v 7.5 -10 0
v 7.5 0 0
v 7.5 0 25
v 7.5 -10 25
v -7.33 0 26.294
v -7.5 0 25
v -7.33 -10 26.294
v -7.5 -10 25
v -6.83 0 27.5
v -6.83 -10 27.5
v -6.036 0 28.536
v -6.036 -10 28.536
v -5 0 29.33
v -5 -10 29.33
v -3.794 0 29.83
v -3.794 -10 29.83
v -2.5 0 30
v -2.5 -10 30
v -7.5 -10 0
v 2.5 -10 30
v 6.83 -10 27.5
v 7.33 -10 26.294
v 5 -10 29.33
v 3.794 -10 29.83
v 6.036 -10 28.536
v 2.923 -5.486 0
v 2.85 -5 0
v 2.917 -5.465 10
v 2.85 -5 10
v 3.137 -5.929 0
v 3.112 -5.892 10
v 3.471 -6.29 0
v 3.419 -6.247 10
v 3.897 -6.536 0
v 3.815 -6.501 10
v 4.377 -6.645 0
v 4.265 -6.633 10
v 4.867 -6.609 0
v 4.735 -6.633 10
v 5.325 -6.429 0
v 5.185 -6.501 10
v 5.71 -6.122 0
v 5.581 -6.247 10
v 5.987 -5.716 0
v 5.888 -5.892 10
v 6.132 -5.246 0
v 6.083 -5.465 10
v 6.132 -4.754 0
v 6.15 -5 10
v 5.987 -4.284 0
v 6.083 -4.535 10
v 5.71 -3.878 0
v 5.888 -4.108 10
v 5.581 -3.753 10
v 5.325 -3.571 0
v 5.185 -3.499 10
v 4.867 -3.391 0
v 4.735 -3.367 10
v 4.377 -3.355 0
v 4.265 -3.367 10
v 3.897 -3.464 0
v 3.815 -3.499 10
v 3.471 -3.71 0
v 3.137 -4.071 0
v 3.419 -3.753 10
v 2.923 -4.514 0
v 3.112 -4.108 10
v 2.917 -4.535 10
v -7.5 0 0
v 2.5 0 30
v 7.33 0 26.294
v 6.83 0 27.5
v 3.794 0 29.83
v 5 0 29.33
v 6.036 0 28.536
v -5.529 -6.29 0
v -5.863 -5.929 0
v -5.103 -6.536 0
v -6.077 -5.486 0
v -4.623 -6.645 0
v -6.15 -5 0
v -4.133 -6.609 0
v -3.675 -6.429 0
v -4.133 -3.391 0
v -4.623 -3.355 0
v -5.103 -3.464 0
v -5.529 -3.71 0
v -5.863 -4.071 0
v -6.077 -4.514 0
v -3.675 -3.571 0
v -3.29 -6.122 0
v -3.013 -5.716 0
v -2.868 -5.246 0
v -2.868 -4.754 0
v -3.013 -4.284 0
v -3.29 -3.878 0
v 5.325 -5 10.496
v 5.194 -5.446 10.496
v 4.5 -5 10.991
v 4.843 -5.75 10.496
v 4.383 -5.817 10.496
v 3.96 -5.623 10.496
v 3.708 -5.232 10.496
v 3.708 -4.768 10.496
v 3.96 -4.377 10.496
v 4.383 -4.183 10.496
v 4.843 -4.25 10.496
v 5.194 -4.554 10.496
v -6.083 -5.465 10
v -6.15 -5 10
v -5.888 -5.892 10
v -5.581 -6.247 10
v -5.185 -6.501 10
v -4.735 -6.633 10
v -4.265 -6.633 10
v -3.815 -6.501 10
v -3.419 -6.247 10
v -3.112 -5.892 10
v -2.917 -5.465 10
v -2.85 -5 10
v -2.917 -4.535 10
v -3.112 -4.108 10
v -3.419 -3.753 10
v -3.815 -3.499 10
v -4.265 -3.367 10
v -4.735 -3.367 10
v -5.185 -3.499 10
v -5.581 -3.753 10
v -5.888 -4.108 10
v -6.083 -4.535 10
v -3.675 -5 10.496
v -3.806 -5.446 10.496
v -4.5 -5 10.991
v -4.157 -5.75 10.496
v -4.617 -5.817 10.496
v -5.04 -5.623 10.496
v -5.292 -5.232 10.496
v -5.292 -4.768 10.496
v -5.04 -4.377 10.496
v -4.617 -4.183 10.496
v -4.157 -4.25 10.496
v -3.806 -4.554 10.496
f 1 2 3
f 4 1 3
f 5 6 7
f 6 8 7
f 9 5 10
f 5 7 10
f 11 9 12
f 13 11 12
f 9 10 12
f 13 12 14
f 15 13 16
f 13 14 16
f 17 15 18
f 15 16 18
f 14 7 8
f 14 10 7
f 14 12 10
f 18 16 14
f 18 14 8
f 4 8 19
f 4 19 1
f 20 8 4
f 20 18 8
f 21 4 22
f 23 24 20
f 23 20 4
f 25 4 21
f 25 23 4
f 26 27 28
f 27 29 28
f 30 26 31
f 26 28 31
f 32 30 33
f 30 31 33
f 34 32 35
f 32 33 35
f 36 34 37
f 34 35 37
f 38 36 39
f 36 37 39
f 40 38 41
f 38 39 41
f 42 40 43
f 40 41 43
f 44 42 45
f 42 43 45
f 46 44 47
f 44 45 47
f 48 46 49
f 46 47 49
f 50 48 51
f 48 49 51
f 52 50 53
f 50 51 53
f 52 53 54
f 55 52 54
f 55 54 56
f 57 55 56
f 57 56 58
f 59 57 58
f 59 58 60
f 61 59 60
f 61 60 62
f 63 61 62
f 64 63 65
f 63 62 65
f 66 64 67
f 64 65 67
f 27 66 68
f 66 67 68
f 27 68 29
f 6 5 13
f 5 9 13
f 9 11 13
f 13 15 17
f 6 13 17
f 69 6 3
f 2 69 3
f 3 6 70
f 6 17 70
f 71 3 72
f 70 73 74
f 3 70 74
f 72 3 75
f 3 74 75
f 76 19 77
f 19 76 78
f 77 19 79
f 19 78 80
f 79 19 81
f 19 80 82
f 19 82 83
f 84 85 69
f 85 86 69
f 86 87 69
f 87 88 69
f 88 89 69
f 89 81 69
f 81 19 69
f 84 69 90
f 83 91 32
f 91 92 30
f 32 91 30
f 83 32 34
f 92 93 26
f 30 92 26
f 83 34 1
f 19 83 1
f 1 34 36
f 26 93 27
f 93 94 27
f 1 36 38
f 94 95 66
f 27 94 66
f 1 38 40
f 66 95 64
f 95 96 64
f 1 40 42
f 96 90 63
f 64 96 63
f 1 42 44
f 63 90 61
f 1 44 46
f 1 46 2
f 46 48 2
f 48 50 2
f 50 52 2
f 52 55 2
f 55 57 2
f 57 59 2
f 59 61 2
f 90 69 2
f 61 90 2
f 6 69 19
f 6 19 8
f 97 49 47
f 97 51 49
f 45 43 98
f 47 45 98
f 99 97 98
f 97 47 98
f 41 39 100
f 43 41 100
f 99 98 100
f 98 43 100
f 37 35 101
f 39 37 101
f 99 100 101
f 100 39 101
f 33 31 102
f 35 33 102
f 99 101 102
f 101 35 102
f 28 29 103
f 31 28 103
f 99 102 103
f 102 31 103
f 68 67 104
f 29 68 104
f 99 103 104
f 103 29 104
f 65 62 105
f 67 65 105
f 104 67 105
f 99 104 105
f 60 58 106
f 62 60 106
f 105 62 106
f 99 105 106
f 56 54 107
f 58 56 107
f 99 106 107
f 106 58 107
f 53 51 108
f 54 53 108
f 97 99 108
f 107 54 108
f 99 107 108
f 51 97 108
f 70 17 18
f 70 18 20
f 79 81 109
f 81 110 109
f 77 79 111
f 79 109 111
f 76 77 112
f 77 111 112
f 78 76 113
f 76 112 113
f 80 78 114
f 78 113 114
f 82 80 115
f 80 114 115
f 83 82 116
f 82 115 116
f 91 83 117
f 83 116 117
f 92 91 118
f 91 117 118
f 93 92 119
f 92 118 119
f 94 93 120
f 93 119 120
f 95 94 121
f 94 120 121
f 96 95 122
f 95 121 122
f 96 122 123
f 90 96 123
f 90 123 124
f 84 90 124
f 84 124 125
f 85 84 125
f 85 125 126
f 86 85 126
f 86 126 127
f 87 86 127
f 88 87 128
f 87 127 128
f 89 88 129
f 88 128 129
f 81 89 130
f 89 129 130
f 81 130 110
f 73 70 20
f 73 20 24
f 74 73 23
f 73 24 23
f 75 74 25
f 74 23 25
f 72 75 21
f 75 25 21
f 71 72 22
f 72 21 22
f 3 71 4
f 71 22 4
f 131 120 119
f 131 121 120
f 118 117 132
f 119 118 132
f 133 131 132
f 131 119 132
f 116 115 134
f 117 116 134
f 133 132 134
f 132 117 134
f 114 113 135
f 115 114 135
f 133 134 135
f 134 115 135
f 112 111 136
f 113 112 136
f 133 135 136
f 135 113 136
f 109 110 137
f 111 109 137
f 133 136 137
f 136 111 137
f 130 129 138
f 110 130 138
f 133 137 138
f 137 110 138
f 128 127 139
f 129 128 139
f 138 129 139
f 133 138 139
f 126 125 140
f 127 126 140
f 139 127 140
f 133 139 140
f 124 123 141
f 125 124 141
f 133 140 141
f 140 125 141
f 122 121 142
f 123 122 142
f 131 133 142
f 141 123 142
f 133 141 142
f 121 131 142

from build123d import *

# Parameters (mm, degrees)
F0_W     = 15
F0_H     = 30
F1_DEPTH = 10
F3_D     = 3.3
F3_DEPTH = 10
F3_TIP   = 0.9914200214
F4_R     = 5


with BuildPart() as f1:
    # F0 (on Front) → F1 (new body)
    with BuildSketch(Plane.XZ):
        with Locations((0, 15)):
            Rectangle(F0_W, F0_H)
    extrude(amount=F1_DEPTH)

    # F3
    with Locations(Plane(origin=(0, 0, 0), x_dir=(1, 0, 0), z_dir=(0, 0, -1))):
        with Locations((-4.5, 5), (4.5, 5)):
            Hole(F3_D / 2, depth=F3_DEPTH)
            with Locations((0, 0, -(F3_DEPTH + F3_TIP / 2))):  # 118° drill point
                Cone(0, F3_D / 2, F3_TIP, mode=Mode.SUBTRACT)

    # F4
    f4_edges = [f1.edges().sort_by_distance(p)[0] for p in [
        (-7.5, -5, 30),
        (7.5, -5, 30),
    ]]
    fillet(f4_edges, radius=F4_R)


solid = f1.part
